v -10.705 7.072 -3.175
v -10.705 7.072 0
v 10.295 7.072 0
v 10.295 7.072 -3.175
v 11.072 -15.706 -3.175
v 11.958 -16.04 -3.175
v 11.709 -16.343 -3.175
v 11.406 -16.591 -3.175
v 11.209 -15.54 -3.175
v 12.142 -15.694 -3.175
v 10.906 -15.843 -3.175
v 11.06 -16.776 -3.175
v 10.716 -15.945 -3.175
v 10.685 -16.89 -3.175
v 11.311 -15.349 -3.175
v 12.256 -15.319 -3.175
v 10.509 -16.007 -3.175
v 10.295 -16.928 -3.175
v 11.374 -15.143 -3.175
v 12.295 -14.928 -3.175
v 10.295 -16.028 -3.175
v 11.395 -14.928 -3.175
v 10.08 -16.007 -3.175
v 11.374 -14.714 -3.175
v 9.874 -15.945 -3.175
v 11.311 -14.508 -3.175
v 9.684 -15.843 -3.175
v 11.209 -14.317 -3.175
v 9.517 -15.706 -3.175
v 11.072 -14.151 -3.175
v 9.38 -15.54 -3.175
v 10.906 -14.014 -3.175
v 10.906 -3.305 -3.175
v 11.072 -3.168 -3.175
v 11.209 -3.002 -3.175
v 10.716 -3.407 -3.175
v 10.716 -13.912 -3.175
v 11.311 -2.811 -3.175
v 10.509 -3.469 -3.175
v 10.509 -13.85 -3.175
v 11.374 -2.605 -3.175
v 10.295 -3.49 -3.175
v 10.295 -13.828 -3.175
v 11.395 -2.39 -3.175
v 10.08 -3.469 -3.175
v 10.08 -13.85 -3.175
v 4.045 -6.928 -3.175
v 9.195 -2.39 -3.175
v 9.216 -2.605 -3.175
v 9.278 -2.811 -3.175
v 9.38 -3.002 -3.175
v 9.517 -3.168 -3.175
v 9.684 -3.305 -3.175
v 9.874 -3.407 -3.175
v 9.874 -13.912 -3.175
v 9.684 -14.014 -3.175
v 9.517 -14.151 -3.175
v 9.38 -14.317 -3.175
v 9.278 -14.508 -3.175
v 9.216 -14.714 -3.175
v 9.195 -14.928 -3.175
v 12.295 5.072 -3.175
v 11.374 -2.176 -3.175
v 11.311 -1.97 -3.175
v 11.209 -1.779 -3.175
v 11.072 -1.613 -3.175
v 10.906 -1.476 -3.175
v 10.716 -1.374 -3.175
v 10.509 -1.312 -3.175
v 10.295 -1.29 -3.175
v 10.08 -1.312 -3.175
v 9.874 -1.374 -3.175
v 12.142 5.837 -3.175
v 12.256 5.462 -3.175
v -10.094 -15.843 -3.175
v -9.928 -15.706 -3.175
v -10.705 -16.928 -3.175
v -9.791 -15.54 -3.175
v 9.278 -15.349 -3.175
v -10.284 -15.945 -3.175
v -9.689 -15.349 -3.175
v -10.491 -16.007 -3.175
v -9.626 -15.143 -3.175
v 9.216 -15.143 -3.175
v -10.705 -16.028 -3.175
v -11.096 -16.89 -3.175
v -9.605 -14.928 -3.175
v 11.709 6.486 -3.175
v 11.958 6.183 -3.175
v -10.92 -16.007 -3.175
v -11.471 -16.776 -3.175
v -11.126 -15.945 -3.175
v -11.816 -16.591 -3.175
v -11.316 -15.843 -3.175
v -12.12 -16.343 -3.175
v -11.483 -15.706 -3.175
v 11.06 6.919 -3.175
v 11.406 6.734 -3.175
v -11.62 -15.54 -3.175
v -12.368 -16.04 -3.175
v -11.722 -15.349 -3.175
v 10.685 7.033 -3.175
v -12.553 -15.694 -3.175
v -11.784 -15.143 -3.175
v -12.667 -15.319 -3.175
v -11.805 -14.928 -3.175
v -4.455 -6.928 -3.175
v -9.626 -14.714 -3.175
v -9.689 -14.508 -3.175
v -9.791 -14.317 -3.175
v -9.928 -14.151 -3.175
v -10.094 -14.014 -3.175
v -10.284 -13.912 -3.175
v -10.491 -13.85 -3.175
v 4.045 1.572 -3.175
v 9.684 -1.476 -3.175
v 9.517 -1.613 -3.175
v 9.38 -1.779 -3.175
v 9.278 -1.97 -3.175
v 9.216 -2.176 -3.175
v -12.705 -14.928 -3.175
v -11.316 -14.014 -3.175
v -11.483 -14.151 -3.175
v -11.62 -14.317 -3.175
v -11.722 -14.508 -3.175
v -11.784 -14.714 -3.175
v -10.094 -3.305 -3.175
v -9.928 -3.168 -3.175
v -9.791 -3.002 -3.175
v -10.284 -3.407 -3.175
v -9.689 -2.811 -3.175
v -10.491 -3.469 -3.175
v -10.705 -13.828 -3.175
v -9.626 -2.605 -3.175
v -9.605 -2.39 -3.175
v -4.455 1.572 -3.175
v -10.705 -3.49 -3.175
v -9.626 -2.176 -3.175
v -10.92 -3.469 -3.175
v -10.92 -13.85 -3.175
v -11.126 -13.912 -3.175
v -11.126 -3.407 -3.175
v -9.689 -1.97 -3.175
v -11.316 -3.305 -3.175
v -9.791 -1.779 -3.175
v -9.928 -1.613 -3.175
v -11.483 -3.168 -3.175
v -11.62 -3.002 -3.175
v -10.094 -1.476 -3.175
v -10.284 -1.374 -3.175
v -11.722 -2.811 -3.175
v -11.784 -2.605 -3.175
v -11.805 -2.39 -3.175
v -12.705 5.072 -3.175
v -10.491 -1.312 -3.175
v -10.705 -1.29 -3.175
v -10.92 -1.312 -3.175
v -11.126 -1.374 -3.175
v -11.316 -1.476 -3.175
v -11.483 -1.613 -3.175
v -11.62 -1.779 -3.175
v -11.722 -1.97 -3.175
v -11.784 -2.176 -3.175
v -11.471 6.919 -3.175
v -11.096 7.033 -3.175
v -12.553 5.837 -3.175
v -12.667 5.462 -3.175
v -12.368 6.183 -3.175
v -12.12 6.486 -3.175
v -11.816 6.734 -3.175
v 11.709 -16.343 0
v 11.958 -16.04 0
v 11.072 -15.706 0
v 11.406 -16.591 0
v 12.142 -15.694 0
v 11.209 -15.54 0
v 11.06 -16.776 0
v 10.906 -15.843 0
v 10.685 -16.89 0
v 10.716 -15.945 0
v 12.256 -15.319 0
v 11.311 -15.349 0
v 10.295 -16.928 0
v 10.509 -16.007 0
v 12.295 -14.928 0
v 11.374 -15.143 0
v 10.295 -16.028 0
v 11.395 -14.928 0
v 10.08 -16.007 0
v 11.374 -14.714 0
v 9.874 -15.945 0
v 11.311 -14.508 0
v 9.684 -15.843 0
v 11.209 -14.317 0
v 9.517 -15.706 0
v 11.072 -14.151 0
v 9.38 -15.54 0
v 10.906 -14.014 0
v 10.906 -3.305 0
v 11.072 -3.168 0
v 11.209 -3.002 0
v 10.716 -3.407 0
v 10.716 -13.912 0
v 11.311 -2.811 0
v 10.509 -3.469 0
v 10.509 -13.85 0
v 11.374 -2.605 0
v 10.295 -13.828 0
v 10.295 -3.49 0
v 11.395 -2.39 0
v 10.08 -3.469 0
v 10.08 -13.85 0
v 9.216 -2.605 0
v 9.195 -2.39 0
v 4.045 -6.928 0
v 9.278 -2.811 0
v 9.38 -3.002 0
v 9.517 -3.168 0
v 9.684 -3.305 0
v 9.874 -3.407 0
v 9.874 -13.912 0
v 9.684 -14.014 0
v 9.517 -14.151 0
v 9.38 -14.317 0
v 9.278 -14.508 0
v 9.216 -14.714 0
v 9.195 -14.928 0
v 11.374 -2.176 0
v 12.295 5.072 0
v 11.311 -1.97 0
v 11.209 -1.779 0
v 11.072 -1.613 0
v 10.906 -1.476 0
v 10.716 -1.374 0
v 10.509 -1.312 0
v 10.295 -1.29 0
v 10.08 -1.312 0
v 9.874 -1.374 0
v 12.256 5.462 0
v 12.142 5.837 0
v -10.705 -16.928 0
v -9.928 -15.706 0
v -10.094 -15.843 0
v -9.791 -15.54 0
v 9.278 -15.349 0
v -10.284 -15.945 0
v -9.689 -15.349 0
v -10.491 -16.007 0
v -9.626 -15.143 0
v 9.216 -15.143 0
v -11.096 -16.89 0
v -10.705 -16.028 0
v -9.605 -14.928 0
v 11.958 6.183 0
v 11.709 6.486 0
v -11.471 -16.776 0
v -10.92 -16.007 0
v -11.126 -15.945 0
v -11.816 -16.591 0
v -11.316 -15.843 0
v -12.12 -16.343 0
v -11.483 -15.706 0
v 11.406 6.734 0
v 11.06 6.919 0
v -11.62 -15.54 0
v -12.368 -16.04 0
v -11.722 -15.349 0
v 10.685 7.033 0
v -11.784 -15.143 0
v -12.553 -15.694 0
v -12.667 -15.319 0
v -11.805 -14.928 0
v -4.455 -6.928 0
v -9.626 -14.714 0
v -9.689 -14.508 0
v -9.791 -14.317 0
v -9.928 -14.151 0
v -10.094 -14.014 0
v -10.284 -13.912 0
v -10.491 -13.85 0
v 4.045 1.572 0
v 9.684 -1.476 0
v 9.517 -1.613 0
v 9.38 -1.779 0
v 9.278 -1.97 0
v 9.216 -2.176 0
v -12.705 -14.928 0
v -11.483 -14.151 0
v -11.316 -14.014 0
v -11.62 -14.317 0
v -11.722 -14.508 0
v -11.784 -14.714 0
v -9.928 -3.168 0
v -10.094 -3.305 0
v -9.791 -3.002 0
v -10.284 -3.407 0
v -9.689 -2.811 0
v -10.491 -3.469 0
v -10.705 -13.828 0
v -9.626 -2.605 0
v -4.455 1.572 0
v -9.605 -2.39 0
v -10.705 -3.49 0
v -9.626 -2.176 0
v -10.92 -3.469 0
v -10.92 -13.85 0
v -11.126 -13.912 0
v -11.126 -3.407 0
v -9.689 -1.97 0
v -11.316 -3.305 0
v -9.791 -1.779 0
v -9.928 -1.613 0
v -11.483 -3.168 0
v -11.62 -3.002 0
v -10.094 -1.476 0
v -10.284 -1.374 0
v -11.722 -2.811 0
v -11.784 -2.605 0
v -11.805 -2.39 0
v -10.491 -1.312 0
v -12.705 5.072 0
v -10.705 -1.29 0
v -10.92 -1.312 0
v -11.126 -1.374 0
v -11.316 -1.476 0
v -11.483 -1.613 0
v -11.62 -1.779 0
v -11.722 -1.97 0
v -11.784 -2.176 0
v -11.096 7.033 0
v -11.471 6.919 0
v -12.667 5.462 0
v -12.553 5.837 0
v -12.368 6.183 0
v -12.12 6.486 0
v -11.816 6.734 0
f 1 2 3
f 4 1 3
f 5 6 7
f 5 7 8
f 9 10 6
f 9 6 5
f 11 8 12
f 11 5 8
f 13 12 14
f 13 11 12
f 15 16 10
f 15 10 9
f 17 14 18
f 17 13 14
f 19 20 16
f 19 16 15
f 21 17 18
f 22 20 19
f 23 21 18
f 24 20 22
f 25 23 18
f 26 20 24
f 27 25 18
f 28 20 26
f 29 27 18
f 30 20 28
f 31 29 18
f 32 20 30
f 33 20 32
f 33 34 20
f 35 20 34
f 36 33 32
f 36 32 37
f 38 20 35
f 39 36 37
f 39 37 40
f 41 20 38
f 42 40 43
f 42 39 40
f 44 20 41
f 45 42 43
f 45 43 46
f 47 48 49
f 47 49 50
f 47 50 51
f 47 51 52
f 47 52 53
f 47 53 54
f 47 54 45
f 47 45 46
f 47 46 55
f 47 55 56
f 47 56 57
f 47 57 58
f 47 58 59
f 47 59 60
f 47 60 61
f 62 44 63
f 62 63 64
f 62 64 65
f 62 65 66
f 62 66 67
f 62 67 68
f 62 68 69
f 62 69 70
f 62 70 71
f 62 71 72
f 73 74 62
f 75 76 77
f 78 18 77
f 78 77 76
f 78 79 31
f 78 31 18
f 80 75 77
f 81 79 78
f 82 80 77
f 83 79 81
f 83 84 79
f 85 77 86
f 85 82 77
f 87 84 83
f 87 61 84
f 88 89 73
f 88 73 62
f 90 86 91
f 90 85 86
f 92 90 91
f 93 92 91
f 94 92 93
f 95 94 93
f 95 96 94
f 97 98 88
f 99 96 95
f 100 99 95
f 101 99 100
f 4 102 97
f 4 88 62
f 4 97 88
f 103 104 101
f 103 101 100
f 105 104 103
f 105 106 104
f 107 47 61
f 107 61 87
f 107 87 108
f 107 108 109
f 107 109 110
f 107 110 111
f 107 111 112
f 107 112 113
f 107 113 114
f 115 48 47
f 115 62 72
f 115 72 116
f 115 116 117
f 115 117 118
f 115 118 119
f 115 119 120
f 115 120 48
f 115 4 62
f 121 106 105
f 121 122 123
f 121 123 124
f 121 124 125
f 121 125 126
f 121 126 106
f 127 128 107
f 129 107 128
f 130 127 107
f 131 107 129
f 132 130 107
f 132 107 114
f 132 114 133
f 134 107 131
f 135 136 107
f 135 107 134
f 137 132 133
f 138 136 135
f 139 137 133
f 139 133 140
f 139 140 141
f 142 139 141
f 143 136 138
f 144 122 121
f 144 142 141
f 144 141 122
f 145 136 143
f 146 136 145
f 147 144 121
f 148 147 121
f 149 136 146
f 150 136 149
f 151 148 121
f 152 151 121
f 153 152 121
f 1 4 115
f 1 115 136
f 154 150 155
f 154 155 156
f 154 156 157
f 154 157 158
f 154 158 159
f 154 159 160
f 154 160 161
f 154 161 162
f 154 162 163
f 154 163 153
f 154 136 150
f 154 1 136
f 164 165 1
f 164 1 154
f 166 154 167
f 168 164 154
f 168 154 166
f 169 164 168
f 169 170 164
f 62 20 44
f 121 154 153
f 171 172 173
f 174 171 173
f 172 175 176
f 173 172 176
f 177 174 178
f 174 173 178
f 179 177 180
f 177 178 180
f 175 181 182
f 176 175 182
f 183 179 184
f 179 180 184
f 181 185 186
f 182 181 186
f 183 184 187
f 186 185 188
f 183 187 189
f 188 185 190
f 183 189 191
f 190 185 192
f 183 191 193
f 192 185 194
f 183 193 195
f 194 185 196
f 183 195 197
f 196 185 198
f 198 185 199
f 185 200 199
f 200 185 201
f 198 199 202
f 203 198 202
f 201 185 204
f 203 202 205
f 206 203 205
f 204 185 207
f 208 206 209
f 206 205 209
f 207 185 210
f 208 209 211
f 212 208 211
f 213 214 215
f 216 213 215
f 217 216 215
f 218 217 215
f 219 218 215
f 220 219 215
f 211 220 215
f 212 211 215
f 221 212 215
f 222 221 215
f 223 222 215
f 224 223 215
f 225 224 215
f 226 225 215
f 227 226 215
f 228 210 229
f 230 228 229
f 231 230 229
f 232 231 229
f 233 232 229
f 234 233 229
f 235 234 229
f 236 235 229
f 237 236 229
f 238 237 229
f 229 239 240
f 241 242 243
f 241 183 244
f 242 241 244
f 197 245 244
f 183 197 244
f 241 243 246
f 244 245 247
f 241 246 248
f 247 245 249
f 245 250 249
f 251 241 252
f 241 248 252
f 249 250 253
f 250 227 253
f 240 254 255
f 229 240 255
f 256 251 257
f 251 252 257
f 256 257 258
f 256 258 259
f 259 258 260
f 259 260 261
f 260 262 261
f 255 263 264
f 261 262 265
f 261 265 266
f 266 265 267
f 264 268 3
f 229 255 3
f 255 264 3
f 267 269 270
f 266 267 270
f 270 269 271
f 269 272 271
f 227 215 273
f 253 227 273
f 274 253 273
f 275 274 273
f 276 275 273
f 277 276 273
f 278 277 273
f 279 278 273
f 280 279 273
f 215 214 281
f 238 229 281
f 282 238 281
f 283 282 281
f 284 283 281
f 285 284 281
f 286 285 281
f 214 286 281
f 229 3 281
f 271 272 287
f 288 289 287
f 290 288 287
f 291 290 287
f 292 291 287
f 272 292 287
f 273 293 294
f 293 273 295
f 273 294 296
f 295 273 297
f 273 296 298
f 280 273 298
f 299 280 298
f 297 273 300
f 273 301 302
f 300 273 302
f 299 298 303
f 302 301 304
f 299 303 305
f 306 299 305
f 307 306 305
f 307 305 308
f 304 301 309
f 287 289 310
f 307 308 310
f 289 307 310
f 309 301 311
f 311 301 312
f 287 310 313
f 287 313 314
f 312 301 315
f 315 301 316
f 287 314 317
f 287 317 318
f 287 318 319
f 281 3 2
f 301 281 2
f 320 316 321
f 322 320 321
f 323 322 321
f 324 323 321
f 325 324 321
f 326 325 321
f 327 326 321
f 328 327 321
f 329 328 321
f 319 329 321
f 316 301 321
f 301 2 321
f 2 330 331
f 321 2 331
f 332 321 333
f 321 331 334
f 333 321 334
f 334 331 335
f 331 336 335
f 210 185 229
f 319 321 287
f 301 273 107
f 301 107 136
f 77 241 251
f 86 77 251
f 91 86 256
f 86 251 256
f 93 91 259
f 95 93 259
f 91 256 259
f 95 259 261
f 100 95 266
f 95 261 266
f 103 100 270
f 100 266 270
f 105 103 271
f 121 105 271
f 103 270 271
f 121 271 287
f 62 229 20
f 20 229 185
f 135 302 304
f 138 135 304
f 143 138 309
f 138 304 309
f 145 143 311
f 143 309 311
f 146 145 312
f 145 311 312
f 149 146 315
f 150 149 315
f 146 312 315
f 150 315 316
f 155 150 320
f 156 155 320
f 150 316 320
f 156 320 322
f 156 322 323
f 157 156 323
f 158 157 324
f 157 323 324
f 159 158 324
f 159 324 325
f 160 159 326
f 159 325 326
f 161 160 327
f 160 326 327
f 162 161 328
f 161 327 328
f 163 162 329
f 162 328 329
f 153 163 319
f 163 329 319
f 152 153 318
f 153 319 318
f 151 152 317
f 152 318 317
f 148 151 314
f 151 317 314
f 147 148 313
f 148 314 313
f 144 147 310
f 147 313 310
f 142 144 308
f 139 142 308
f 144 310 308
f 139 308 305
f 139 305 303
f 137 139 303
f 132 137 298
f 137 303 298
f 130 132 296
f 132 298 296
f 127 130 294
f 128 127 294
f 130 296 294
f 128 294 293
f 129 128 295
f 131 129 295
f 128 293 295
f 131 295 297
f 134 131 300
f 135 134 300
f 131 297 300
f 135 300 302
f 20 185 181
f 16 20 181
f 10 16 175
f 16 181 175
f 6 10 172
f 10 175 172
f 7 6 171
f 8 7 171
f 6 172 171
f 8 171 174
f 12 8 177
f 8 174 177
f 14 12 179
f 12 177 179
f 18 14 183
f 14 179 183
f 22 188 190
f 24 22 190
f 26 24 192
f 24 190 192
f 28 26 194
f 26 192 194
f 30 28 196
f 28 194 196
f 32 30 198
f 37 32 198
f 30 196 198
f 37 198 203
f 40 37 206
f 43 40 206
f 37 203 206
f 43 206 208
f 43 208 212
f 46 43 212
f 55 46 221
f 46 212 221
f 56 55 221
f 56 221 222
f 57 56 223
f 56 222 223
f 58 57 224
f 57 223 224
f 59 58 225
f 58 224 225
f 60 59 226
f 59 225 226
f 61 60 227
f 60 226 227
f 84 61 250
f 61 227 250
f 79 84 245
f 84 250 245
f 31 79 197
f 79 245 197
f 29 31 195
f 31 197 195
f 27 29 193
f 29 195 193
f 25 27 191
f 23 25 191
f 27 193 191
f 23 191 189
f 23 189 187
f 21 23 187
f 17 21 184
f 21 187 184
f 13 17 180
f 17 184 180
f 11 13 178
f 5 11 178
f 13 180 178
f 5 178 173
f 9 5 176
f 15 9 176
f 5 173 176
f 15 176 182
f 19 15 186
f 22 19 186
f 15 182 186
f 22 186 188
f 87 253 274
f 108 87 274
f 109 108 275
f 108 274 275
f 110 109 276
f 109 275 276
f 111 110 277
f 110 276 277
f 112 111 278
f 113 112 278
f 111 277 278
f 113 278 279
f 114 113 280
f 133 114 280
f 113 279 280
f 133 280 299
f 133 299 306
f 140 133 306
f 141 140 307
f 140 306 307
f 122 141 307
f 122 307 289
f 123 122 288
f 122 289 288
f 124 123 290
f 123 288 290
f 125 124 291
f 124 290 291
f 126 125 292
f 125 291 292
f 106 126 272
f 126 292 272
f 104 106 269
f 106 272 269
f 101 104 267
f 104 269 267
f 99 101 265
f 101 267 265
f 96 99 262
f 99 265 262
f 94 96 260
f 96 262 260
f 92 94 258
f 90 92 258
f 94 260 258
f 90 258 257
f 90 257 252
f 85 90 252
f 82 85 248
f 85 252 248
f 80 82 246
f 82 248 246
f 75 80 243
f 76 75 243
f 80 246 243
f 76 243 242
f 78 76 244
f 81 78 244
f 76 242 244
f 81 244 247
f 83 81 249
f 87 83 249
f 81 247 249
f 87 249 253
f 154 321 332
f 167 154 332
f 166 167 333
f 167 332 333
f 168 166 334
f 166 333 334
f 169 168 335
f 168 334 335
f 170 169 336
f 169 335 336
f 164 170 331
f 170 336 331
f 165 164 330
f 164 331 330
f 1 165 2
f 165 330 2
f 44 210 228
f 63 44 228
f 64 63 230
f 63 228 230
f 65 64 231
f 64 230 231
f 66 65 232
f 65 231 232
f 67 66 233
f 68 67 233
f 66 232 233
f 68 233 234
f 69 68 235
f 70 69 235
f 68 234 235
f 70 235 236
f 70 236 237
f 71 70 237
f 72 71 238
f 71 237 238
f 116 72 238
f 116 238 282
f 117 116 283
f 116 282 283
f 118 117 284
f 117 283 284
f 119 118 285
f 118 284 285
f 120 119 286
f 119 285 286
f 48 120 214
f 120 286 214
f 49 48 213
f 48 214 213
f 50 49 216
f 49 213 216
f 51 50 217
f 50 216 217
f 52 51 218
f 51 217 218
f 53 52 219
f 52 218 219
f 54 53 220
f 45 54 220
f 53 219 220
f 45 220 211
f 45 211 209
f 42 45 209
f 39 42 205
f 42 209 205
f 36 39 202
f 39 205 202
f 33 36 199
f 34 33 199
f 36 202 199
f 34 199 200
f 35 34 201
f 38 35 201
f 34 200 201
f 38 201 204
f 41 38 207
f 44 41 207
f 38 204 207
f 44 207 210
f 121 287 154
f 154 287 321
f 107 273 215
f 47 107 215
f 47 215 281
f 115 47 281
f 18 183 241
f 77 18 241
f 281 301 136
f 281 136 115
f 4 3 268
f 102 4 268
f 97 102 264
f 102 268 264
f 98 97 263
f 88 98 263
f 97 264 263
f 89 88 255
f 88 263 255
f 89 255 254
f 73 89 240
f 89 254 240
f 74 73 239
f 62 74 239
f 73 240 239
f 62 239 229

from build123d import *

# Parameters (mm, degrees)
SKETCH1_R           = 1.1
SKETCH1_W           = 8.5
SKETCH1_H           = 8.5
BOSS_EXTRUDE1_DEPTH = 3.175


with BuildPart() as part:
    # Sketch1 → Boss-Extrude1 (new body)
    with BuildSketch(Plane.XY):
        with BuildLine():
            Line((-10.705332644, 7.071510672), (10.294667356, 7.071510672))
            ThreePointArc((10.294667356, 7.071510672), (11.708880919, 6.485724235), (12.294667356, 5.071510672))
            Line((12.294667356, 5.071510672), (12.294667356, -14.928489328))
            ThreePointArc((12.294667356, -14.928489328), (11.708880919, -16.34270289), (10.294667356, -16.928489328))
            Line((10.294667356, -16.928489328), (-10.705332644, -16.928489328))
            ThreePointArc((-10.705332644, -16.928489328), (-12.119546206, -16.34270289), (-12.705332644, -14.928489328))
            Line((-12.705332644, -14.928489328), (-12.705332644, 5.071510672))
            ThreePointArc((-12.705332644, 5.071510672), (-12.119546206, 6.485724235), (-10.705332644, 7.071510672))
        make_face()
        with Locations((-10.705332644, -14.928489328)):
            Circle(SKETCH1_R, mode=Mode.SUBTRACT)
        with Locations((-10.705332644, -2.390489328)):
            Circle(SKETCH1_R, mode=Mode.SUBTRACT)
        with Locations((10.294667356, -2.390489328)):
            Circle(SKETCH1_R, mode=Mode.SUBTRACT)
        with Locations((10.294667356, -14.928489328)):
            Circle(SKETCH1_R, mode=Mode.SUBTRACT)
        with Locations((-0.205332644, -2.678489328)):
            Rectangle(SKETCH1_W, SKETCH1_H, mode=Mode.SUBTRACT)
    extrude(amount=-BOSS_EXTRUDE1_DEPTH)


solid = part.part
